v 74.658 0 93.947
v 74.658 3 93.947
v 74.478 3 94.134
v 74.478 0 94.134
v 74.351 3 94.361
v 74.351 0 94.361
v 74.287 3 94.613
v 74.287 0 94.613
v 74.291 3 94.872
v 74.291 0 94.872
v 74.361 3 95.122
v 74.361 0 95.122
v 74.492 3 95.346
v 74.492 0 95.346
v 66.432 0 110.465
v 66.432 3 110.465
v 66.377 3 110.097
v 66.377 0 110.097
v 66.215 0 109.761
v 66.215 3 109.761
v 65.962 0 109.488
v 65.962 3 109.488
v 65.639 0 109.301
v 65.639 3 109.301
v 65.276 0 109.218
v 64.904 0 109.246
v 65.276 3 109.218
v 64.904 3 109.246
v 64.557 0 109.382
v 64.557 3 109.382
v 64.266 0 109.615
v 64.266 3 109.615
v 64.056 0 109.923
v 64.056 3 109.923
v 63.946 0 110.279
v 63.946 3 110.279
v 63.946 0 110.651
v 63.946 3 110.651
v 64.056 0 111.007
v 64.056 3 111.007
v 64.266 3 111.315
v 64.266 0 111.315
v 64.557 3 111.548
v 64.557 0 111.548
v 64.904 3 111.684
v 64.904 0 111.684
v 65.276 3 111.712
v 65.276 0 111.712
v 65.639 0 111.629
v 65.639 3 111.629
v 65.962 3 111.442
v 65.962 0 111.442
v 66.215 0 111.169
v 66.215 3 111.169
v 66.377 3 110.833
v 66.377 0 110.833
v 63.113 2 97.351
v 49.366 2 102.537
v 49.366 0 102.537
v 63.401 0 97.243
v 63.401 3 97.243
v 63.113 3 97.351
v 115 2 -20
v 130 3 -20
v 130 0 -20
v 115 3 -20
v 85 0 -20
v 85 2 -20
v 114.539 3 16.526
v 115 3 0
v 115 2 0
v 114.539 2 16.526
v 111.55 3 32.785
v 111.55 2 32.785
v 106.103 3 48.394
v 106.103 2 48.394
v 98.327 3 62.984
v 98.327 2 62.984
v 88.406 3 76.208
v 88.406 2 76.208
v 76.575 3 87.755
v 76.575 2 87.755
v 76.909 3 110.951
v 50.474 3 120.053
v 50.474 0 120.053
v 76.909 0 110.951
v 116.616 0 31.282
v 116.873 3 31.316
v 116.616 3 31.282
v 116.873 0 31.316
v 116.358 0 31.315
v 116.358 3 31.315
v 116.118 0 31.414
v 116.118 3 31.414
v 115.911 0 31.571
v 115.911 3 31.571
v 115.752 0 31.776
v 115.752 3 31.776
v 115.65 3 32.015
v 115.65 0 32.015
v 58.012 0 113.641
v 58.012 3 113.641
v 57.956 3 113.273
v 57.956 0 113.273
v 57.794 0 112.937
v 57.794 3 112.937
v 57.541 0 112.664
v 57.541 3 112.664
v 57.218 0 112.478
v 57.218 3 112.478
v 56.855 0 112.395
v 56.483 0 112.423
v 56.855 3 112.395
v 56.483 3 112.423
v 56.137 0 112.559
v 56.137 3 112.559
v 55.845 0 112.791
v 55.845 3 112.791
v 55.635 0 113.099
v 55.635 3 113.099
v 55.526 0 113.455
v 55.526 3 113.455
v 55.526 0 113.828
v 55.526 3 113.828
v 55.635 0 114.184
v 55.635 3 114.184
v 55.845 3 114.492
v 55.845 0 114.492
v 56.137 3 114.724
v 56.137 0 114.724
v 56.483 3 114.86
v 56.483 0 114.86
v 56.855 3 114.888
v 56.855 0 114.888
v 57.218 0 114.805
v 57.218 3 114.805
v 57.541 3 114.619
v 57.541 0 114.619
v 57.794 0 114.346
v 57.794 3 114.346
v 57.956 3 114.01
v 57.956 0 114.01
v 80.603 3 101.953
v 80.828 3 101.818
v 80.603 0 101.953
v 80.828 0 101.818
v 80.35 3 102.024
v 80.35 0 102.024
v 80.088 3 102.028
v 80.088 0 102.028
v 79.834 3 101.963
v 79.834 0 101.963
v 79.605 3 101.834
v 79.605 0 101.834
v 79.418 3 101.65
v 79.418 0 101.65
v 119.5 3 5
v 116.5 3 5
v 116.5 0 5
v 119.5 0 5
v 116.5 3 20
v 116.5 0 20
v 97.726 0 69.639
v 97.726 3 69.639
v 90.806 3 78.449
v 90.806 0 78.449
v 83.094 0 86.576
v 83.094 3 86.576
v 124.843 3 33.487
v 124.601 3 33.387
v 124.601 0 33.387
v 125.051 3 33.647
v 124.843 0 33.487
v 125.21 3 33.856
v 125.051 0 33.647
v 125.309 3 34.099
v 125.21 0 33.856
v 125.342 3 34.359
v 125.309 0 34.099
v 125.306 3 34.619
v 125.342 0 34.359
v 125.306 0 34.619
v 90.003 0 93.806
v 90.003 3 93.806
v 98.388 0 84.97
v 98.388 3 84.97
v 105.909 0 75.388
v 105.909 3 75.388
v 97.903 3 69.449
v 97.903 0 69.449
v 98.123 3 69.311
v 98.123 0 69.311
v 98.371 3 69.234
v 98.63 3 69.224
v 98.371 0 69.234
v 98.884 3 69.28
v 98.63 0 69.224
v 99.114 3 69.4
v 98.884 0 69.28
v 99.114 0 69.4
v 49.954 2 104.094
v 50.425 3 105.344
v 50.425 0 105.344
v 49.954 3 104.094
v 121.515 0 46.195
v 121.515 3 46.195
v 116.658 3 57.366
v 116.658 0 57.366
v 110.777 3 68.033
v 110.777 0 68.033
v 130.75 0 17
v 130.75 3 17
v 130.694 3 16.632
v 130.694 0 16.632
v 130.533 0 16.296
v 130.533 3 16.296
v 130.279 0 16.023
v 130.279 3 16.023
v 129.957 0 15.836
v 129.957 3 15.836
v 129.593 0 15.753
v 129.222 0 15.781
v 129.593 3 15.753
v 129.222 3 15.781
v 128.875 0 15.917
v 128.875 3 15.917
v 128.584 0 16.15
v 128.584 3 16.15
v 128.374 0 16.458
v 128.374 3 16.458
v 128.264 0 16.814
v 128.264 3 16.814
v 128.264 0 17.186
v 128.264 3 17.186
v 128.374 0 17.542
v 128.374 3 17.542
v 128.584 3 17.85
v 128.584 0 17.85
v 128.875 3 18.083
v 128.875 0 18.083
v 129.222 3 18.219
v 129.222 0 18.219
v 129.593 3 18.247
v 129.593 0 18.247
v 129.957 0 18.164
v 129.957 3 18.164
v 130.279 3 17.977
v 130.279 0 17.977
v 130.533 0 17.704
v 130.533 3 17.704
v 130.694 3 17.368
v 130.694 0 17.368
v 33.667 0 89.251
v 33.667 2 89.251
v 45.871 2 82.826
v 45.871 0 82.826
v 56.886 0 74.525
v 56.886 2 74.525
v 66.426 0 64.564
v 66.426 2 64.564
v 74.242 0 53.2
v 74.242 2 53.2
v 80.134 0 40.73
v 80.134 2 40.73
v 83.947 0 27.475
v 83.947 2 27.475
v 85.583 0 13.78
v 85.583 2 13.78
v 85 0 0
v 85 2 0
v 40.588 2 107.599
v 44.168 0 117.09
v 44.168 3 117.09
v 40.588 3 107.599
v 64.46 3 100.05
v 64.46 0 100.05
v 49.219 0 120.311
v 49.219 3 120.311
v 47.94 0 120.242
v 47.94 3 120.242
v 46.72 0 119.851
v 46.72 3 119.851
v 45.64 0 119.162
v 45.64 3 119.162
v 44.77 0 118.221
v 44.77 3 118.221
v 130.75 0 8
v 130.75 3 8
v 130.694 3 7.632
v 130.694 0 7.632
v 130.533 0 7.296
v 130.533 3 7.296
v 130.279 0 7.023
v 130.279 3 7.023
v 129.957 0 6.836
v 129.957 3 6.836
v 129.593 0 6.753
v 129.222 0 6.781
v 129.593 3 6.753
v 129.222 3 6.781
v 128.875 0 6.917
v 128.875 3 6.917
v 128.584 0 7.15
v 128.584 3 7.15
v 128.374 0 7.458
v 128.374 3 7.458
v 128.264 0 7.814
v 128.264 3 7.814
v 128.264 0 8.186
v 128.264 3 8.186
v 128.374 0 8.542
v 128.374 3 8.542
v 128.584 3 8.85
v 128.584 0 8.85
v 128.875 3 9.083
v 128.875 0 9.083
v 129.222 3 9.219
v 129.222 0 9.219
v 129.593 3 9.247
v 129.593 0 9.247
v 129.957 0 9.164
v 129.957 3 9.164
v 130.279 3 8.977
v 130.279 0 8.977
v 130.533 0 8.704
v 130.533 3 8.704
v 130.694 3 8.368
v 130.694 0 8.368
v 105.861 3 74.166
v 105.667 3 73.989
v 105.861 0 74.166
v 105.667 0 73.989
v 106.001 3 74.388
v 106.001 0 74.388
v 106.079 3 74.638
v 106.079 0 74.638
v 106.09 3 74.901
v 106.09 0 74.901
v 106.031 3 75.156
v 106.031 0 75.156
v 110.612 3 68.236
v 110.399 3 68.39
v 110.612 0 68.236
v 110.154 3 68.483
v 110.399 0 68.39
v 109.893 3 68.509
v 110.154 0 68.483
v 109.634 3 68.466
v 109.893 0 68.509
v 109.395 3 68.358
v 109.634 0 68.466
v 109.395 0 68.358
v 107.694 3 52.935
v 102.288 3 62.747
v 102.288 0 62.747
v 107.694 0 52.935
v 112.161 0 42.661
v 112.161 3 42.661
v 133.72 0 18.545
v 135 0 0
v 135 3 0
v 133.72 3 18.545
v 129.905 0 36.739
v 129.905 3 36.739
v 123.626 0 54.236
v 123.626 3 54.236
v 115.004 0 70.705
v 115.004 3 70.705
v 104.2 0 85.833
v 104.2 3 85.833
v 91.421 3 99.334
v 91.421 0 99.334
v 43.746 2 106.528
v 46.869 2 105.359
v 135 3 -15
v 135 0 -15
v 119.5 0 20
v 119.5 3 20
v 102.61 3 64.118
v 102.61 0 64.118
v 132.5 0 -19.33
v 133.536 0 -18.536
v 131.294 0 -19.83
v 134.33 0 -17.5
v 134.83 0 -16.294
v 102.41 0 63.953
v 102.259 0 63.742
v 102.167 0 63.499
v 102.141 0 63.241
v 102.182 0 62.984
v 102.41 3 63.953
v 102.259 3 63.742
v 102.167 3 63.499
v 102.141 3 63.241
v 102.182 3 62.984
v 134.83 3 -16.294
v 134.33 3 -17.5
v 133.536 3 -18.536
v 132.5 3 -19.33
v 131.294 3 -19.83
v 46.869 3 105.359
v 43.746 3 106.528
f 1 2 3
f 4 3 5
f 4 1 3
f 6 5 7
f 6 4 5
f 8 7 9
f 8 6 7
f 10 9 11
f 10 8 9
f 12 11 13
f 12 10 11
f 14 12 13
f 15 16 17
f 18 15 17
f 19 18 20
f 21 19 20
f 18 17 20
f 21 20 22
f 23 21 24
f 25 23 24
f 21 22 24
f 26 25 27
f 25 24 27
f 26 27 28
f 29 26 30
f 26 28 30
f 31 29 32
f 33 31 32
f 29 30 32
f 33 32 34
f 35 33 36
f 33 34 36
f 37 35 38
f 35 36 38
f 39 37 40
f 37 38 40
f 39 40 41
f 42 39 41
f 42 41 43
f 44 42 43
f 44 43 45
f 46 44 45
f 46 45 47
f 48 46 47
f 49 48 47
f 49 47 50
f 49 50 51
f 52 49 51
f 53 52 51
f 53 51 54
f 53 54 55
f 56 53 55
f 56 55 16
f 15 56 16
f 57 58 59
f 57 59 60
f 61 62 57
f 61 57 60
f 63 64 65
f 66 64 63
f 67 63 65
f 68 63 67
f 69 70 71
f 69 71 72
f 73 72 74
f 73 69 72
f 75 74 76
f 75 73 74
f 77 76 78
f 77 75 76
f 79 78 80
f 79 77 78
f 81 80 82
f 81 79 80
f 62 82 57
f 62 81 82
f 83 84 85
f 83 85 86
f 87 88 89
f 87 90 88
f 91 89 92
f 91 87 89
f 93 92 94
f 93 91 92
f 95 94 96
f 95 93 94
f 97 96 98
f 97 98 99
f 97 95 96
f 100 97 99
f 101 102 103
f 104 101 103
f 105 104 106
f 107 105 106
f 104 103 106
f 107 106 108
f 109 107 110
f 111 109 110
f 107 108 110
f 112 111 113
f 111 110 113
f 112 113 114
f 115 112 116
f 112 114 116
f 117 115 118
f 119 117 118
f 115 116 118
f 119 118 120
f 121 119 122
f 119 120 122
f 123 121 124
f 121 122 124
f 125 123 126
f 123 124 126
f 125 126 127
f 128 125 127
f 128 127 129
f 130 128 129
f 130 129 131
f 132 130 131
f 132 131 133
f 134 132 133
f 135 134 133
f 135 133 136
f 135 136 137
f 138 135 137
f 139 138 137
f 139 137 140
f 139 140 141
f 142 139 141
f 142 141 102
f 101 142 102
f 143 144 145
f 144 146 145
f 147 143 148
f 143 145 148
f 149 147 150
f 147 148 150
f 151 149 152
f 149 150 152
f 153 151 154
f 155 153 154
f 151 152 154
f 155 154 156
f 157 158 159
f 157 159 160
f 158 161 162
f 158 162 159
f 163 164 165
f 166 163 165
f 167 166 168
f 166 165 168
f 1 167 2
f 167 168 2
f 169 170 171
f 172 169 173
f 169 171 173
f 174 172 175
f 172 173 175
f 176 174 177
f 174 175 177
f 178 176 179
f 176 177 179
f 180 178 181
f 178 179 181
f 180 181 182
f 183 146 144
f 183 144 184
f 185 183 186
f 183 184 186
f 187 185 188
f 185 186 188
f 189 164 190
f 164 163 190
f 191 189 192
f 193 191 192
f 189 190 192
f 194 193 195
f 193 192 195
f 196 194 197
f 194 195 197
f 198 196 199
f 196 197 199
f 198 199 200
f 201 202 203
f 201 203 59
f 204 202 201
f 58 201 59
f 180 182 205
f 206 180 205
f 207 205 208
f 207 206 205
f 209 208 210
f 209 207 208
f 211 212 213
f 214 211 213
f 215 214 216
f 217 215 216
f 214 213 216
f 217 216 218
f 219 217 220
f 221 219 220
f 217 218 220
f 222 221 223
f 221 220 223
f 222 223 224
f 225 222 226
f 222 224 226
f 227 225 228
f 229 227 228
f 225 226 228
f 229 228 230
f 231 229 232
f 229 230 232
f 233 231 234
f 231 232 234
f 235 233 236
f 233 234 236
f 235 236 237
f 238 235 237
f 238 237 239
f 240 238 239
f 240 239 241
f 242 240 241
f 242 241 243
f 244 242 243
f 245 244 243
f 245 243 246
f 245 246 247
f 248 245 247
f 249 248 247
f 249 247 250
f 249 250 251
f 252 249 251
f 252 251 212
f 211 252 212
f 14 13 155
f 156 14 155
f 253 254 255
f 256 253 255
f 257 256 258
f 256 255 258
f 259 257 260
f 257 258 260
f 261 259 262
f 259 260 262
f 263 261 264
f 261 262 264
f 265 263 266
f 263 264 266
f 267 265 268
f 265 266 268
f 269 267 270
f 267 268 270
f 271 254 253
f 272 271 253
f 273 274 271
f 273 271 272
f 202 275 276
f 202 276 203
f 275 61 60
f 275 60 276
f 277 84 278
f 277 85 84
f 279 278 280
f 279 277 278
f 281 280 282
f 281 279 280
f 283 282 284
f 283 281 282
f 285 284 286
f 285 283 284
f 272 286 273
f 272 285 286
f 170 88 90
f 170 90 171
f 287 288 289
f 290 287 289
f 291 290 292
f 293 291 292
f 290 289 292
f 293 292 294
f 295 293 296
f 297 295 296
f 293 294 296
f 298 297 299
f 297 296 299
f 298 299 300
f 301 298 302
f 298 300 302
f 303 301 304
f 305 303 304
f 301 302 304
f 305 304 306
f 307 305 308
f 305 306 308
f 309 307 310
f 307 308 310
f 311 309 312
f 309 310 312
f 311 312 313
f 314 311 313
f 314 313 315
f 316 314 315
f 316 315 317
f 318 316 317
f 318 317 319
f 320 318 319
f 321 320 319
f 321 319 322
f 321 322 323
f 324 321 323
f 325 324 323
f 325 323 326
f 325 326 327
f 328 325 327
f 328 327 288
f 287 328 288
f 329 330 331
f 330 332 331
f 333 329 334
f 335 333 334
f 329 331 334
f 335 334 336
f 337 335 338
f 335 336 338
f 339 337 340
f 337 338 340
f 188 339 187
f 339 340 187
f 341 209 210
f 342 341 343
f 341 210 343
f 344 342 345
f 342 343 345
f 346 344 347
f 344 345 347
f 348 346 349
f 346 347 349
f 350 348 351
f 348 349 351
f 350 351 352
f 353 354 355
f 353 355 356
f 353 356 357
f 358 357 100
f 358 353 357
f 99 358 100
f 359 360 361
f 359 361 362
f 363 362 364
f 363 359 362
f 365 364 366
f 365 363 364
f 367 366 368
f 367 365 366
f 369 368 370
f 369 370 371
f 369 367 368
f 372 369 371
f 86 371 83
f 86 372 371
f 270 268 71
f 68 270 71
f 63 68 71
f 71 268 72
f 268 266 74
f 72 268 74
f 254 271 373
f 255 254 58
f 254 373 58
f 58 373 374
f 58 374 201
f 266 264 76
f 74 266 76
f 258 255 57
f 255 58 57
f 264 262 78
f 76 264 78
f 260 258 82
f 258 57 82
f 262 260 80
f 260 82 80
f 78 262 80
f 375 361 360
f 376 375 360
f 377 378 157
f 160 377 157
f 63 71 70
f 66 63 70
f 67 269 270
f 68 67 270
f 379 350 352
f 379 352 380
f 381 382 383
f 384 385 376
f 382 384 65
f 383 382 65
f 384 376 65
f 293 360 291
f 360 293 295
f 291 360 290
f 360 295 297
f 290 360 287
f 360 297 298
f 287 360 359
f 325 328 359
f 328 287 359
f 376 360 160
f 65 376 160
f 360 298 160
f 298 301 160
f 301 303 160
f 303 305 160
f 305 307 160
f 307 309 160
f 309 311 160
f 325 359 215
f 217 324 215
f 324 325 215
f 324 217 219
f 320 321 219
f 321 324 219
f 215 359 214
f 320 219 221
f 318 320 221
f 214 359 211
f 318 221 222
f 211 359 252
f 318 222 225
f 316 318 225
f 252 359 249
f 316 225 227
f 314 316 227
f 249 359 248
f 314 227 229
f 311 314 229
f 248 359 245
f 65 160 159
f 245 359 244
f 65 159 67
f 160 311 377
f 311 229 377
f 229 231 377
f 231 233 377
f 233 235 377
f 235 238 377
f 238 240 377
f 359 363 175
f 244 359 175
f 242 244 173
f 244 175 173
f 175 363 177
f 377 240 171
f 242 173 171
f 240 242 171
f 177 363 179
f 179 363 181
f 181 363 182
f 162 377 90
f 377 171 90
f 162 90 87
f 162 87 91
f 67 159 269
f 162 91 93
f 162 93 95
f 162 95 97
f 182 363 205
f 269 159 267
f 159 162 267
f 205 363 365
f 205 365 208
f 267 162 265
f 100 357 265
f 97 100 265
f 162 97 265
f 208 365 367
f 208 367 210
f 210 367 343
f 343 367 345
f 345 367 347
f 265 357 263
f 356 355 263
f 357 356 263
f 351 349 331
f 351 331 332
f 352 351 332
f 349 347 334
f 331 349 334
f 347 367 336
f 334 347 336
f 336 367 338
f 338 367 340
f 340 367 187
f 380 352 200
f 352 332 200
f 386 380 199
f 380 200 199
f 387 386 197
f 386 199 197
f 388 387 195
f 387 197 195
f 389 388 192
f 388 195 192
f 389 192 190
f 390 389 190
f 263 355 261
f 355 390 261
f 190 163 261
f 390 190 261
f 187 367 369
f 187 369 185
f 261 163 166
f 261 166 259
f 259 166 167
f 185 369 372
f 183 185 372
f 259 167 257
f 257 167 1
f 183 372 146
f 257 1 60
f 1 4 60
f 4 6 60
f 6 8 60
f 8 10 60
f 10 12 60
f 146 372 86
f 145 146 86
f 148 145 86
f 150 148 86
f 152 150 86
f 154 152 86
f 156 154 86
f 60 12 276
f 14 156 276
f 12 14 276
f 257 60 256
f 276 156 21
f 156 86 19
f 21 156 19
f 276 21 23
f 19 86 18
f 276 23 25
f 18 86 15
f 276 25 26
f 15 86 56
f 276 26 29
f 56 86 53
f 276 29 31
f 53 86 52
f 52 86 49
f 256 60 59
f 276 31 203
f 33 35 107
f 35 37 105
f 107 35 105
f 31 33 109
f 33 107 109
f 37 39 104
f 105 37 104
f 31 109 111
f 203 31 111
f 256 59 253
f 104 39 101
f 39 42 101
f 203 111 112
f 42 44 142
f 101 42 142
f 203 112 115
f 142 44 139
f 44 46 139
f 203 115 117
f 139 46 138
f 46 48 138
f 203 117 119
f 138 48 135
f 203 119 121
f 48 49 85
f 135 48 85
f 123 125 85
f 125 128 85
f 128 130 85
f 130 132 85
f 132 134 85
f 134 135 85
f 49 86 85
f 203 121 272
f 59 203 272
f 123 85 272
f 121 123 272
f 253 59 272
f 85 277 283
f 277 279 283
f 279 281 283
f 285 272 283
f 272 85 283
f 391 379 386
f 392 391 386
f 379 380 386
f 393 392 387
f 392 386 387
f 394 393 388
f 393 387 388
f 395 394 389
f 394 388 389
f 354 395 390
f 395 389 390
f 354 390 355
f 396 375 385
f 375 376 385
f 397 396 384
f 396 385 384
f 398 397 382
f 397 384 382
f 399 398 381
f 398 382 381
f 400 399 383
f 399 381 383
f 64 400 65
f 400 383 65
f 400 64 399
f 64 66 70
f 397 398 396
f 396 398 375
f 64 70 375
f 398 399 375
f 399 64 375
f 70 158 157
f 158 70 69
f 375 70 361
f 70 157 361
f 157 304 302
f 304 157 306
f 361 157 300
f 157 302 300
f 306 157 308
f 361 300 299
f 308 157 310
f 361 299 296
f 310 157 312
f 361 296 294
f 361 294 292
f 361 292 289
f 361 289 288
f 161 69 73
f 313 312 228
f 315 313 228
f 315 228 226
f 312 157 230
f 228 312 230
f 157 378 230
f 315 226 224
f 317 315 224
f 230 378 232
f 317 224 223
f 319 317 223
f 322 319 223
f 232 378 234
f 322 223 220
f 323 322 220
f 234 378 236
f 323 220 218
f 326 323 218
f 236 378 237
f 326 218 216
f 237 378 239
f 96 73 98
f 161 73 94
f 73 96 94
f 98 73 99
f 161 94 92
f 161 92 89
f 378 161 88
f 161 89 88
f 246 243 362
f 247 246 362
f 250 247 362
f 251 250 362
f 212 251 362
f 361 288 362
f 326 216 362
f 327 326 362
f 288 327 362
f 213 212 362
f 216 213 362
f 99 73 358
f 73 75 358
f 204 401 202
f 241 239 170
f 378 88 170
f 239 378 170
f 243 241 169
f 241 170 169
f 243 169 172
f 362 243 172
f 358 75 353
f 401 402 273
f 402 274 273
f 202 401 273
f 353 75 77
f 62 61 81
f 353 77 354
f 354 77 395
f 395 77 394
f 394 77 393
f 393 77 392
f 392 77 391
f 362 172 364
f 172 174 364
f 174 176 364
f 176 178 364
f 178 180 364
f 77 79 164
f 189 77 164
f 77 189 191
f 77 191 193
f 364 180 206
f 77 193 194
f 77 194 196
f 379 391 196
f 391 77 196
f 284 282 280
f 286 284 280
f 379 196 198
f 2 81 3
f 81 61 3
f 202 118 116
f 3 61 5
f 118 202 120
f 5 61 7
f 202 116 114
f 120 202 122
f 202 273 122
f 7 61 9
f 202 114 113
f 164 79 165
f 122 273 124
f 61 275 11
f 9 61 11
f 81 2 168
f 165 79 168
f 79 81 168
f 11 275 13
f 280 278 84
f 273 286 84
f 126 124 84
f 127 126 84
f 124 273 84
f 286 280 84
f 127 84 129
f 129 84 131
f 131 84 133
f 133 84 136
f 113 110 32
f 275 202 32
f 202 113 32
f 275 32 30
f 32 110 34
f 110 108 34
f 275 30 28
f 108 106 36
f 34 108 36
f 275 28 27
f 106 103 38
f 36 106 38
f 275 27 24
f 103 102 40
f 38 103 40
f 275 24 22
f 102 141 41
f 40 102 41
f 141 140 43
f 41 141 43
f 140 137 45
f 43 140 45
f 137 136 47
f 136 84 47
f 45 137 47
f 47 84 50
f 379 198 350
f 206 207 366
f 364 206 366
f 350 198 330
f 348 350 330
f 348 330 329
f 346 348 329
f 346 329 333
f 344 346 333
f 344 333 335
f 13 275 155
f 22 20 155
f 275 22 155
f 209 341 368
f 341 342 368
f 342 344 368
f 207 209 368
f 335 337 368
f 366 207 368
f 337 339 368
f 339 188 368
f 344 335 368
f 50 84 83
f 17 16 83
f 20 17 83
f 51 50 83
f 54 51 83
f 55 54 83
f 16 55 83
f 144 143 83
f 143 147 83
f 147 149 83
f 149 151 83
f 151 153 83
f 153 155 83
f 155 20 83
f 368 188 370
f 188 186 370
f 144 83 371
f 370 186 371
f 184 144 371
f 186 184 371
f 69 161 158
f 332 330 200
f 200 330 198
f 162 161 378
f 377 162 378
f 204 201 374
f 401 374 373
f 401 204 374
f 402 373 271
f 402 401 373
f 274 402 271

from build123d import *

# Parameters (mm, degrees)
EXTRUDE_2_DEPTH     = 3
CUT_EXTRUDE_1_DEPTH = 3
CUT_EXTRUDE_2_DEPTH = 3
CUT_EXTRUDE_3_DEPTH = 1
SKETCH_16_R         = 85.646074049
CUT_EXTRUDE_6_DEPTH = 10
EXTRUDE_3_DEPTH     = 20
FILLET_1_R          = 5
SKETCH_14_R         = 1.25
SKETCH_14_W         = 3
SKETCH_14_H         = 15
CUT_EXTRUDE_8_DEPTH = 10
CUT_EXTRUDE_9_DEPTH = 10
FILLET_2_R          = 1


with BuildPart() as part:
    # 草图4 → 凸台-拉伸2 (new body)
    with BuildSketch(Plane(origin=(0, 0, 0), x_dir=(1, 0, 0), z_dir=(0, 1, 0))):
        with BuildLine():
            Line((0, 0), (135, 0))
            ThreePointArc((135, 0), (95.45941546, -95.45941546), (0, -135))
            Line((0, -135), (0, 0))
        make_face()
    extrude(amount=EXTRUDE_2_DEPTH)

    # 草图6 → 切除-拉伸1 (cut)
    with BuildSketch(Plane(origin=(0, 3, 0), x_dir=(1, 0, 0), z_dir=(0, 1, 0))):
        with BuildLine():
            Line((0, 0), (85, 0))
            ThreePointArc((85, 0), (69.910657271, -48.347699015), (30, -79.529868603))
            Line((30, -79.529868603), (47.647058824, -126.312144252))
            ThreePointArc((47.647058824, -126.312144252), (24.216322244, -132.810277227), (0, -135))
            Line((0, -135), (0, -18))
            Line((0, -18), (0, 0))
        make_face()
    extrude(amount=-CUT_EXTRUDE_1_DEPTH, mode=Mode.SUBTRACT)

    # 草图8 → 切除-拉伸2 (cut)
    with BuildSketch(Plane(origin=(0, 3, 0), x_dir=(1, 0, 0), z_dir=(0, 1, 0))):
        with BuildLine():
            Line((45.882352941, -121.633916687), (76.908655449, -110.950703995))
            ThreePointArc((76.908655449, -110.950703995), (62.749700806, -119.530226507), (47.647058824, -126.312144252))
            Line((47.647058824, -126.312144252), (45.882352941, -121.633916687))
        make_face()
    extrude(amount=-CUT_EXTRUDE_2_DEPTH, mode=Mode.SUBTRACT)

    # 草图9 → 切除-拉伸3 (cut)
    with BuildSketch(Plane(origin=(0, 3, 0), x_dir=(1, 0, 0), z_dir=(0, 1, 0))):
        with BuildLine():
            Line((40.588235294, -107.599233992), (30, -79.529868603))
            ThreePointArc((30, -79.529868603), (69.910657271, -48.347699015), (85, 0))
            Line((85, 0), (115, 0))
            ThreePointArc((115, 0), (96.045984502, -66.421952411), (40.588235294, -107.599233992))
        make_face()
    extrude(amount=-CUT_EXTRUDE_3_DEPTH, mode=Mode.SUBTRACT)

    # 草图16 → 切除-拉伸6 (cut)
    with BuildSketch(Plane(origin=(0, 2, 0), x_dir=(1, 0, 0), z_dir=(0, 1, 0))):
        with Locations((0, -10.5)):
            Circle(SKETCH_16_R)
    extrude(amount=-CUT_EXTRUDE_6_DEPTH, mode=Mode.SUBTRACT)

    # 草图13 → 凸台-拉伸3 (add)
    with BuildSketch(Plane(origin=(0, 0, 0), x_dir=(-1, 0, 0), z_dir=(0, 0, -1))):
        Polygon((-135, 3), (-135, 0), (-85, 0), (-85, 2), (-115, 2), (-115, 3), align=None)
    extrude(amount=EXTRUDE_3_DEPTH)

    # 圆角1
    fillet_1_edges = [part.edges().sort_by_distance(p)[0] for p in [
        (45.882352941, 1.5, 121.633916687),
        (135, 1.5, -20),
    ]]
    fillet(fillet_1_edges, radius=FILLET_1_R)

    # 草图14 → 切除-拉伸8 (cut)
    with BuildSketch(Plane(origin=(0, 3, 0), x_dir=(1, 0, 0), z_dir=(0, 1, 0))):
        with Locations((129.5, -17)):
            Circle(SKETCH_14_R)
        with Locations((129.5, -8)):
            Circle(SKETCH_14_R)
        with Locations((56.761619346, -113.641470943)):
            Circle(SKETCH_14_R)
        with Locations((65.182428963, -110.465000355)):
            Circle(SKETCH_14_R)
        with Locations((118, -12.5)):
            Rectangle(SKETCH_14_W, SKETCH_14_H)
        Polygon((50.425271043, -105.343839343), (49.366447513, -102.536902804), (63.401130208, -97.242785157), (64.459953737, -100.049721696), align=None)
    extrude(amount=-CUT_EXTRUDE_8_DEPTH, mode=Mode.SUBTRACT)

    # 草图17 → 切除-拉伸9 (cut)
    with BuildSketch(Plane(origin=(0, 3, 0), x_dir=(1, 0, 0), z_dir=(0, 1, 0))):
        with BuildLine():
            Line((115.911099155, -31.058285412), (125.570357418, -33.646475863))
            ThreePointArc((125.570357418, -33.646475863), (119.21780967, -51.83737896), (110.2462525, -68.88950435))
            Line((110.2462525, -68.88950435), (101.765771539, -63.590311708))
            ThreePointArc((101.765771539, -63.590311708), (110.047208926, -47.849888271), (115.911099155, -31.058285412))
        make_face()
        with BuildLine():
            Line((73.879377039, -94.561290433), (80.035991792, -102.441397969))
            ThreePointArc((80.035991792, -102.441397969), (94.298668232, -89.48609484), (106.489765758, -74.564936726))
            Line((106.489765758, -74.564936726), (98.298245315, -68.829172362))
            ThreePointArc((98.298245315, -68.829172362), (87.044924521, -82.602549083), (73.879377039, -94.561290433))
        make_face()
    extrude(amount=-CUT_EXTRUDE_9_DEPTH, mode=Mode.SUBTRACT)

    # 圆角2
    fillet_2_edges = [part.edges().sort_by_distance(p)[0] for p in [
        (73.879377039, 1.5, 94.561290433),
        (98.298245315, 1.5, 68.829172362),
        (106.489765758, 1.5, 74.564936726),
        (80.035991792, 1.5, 102.441397969),
        (101.765771539, 1.5, 63.590311708),
        (115.911099155, 1.5, 31.058285412),
        (125.570357418, 1.5, 33.646475863),
        (110.2462525, 1.5, 68.88950435),
    ]]
    fillet(fillet_2_edges, radius=FILLET_2_R)


solid = part.part
